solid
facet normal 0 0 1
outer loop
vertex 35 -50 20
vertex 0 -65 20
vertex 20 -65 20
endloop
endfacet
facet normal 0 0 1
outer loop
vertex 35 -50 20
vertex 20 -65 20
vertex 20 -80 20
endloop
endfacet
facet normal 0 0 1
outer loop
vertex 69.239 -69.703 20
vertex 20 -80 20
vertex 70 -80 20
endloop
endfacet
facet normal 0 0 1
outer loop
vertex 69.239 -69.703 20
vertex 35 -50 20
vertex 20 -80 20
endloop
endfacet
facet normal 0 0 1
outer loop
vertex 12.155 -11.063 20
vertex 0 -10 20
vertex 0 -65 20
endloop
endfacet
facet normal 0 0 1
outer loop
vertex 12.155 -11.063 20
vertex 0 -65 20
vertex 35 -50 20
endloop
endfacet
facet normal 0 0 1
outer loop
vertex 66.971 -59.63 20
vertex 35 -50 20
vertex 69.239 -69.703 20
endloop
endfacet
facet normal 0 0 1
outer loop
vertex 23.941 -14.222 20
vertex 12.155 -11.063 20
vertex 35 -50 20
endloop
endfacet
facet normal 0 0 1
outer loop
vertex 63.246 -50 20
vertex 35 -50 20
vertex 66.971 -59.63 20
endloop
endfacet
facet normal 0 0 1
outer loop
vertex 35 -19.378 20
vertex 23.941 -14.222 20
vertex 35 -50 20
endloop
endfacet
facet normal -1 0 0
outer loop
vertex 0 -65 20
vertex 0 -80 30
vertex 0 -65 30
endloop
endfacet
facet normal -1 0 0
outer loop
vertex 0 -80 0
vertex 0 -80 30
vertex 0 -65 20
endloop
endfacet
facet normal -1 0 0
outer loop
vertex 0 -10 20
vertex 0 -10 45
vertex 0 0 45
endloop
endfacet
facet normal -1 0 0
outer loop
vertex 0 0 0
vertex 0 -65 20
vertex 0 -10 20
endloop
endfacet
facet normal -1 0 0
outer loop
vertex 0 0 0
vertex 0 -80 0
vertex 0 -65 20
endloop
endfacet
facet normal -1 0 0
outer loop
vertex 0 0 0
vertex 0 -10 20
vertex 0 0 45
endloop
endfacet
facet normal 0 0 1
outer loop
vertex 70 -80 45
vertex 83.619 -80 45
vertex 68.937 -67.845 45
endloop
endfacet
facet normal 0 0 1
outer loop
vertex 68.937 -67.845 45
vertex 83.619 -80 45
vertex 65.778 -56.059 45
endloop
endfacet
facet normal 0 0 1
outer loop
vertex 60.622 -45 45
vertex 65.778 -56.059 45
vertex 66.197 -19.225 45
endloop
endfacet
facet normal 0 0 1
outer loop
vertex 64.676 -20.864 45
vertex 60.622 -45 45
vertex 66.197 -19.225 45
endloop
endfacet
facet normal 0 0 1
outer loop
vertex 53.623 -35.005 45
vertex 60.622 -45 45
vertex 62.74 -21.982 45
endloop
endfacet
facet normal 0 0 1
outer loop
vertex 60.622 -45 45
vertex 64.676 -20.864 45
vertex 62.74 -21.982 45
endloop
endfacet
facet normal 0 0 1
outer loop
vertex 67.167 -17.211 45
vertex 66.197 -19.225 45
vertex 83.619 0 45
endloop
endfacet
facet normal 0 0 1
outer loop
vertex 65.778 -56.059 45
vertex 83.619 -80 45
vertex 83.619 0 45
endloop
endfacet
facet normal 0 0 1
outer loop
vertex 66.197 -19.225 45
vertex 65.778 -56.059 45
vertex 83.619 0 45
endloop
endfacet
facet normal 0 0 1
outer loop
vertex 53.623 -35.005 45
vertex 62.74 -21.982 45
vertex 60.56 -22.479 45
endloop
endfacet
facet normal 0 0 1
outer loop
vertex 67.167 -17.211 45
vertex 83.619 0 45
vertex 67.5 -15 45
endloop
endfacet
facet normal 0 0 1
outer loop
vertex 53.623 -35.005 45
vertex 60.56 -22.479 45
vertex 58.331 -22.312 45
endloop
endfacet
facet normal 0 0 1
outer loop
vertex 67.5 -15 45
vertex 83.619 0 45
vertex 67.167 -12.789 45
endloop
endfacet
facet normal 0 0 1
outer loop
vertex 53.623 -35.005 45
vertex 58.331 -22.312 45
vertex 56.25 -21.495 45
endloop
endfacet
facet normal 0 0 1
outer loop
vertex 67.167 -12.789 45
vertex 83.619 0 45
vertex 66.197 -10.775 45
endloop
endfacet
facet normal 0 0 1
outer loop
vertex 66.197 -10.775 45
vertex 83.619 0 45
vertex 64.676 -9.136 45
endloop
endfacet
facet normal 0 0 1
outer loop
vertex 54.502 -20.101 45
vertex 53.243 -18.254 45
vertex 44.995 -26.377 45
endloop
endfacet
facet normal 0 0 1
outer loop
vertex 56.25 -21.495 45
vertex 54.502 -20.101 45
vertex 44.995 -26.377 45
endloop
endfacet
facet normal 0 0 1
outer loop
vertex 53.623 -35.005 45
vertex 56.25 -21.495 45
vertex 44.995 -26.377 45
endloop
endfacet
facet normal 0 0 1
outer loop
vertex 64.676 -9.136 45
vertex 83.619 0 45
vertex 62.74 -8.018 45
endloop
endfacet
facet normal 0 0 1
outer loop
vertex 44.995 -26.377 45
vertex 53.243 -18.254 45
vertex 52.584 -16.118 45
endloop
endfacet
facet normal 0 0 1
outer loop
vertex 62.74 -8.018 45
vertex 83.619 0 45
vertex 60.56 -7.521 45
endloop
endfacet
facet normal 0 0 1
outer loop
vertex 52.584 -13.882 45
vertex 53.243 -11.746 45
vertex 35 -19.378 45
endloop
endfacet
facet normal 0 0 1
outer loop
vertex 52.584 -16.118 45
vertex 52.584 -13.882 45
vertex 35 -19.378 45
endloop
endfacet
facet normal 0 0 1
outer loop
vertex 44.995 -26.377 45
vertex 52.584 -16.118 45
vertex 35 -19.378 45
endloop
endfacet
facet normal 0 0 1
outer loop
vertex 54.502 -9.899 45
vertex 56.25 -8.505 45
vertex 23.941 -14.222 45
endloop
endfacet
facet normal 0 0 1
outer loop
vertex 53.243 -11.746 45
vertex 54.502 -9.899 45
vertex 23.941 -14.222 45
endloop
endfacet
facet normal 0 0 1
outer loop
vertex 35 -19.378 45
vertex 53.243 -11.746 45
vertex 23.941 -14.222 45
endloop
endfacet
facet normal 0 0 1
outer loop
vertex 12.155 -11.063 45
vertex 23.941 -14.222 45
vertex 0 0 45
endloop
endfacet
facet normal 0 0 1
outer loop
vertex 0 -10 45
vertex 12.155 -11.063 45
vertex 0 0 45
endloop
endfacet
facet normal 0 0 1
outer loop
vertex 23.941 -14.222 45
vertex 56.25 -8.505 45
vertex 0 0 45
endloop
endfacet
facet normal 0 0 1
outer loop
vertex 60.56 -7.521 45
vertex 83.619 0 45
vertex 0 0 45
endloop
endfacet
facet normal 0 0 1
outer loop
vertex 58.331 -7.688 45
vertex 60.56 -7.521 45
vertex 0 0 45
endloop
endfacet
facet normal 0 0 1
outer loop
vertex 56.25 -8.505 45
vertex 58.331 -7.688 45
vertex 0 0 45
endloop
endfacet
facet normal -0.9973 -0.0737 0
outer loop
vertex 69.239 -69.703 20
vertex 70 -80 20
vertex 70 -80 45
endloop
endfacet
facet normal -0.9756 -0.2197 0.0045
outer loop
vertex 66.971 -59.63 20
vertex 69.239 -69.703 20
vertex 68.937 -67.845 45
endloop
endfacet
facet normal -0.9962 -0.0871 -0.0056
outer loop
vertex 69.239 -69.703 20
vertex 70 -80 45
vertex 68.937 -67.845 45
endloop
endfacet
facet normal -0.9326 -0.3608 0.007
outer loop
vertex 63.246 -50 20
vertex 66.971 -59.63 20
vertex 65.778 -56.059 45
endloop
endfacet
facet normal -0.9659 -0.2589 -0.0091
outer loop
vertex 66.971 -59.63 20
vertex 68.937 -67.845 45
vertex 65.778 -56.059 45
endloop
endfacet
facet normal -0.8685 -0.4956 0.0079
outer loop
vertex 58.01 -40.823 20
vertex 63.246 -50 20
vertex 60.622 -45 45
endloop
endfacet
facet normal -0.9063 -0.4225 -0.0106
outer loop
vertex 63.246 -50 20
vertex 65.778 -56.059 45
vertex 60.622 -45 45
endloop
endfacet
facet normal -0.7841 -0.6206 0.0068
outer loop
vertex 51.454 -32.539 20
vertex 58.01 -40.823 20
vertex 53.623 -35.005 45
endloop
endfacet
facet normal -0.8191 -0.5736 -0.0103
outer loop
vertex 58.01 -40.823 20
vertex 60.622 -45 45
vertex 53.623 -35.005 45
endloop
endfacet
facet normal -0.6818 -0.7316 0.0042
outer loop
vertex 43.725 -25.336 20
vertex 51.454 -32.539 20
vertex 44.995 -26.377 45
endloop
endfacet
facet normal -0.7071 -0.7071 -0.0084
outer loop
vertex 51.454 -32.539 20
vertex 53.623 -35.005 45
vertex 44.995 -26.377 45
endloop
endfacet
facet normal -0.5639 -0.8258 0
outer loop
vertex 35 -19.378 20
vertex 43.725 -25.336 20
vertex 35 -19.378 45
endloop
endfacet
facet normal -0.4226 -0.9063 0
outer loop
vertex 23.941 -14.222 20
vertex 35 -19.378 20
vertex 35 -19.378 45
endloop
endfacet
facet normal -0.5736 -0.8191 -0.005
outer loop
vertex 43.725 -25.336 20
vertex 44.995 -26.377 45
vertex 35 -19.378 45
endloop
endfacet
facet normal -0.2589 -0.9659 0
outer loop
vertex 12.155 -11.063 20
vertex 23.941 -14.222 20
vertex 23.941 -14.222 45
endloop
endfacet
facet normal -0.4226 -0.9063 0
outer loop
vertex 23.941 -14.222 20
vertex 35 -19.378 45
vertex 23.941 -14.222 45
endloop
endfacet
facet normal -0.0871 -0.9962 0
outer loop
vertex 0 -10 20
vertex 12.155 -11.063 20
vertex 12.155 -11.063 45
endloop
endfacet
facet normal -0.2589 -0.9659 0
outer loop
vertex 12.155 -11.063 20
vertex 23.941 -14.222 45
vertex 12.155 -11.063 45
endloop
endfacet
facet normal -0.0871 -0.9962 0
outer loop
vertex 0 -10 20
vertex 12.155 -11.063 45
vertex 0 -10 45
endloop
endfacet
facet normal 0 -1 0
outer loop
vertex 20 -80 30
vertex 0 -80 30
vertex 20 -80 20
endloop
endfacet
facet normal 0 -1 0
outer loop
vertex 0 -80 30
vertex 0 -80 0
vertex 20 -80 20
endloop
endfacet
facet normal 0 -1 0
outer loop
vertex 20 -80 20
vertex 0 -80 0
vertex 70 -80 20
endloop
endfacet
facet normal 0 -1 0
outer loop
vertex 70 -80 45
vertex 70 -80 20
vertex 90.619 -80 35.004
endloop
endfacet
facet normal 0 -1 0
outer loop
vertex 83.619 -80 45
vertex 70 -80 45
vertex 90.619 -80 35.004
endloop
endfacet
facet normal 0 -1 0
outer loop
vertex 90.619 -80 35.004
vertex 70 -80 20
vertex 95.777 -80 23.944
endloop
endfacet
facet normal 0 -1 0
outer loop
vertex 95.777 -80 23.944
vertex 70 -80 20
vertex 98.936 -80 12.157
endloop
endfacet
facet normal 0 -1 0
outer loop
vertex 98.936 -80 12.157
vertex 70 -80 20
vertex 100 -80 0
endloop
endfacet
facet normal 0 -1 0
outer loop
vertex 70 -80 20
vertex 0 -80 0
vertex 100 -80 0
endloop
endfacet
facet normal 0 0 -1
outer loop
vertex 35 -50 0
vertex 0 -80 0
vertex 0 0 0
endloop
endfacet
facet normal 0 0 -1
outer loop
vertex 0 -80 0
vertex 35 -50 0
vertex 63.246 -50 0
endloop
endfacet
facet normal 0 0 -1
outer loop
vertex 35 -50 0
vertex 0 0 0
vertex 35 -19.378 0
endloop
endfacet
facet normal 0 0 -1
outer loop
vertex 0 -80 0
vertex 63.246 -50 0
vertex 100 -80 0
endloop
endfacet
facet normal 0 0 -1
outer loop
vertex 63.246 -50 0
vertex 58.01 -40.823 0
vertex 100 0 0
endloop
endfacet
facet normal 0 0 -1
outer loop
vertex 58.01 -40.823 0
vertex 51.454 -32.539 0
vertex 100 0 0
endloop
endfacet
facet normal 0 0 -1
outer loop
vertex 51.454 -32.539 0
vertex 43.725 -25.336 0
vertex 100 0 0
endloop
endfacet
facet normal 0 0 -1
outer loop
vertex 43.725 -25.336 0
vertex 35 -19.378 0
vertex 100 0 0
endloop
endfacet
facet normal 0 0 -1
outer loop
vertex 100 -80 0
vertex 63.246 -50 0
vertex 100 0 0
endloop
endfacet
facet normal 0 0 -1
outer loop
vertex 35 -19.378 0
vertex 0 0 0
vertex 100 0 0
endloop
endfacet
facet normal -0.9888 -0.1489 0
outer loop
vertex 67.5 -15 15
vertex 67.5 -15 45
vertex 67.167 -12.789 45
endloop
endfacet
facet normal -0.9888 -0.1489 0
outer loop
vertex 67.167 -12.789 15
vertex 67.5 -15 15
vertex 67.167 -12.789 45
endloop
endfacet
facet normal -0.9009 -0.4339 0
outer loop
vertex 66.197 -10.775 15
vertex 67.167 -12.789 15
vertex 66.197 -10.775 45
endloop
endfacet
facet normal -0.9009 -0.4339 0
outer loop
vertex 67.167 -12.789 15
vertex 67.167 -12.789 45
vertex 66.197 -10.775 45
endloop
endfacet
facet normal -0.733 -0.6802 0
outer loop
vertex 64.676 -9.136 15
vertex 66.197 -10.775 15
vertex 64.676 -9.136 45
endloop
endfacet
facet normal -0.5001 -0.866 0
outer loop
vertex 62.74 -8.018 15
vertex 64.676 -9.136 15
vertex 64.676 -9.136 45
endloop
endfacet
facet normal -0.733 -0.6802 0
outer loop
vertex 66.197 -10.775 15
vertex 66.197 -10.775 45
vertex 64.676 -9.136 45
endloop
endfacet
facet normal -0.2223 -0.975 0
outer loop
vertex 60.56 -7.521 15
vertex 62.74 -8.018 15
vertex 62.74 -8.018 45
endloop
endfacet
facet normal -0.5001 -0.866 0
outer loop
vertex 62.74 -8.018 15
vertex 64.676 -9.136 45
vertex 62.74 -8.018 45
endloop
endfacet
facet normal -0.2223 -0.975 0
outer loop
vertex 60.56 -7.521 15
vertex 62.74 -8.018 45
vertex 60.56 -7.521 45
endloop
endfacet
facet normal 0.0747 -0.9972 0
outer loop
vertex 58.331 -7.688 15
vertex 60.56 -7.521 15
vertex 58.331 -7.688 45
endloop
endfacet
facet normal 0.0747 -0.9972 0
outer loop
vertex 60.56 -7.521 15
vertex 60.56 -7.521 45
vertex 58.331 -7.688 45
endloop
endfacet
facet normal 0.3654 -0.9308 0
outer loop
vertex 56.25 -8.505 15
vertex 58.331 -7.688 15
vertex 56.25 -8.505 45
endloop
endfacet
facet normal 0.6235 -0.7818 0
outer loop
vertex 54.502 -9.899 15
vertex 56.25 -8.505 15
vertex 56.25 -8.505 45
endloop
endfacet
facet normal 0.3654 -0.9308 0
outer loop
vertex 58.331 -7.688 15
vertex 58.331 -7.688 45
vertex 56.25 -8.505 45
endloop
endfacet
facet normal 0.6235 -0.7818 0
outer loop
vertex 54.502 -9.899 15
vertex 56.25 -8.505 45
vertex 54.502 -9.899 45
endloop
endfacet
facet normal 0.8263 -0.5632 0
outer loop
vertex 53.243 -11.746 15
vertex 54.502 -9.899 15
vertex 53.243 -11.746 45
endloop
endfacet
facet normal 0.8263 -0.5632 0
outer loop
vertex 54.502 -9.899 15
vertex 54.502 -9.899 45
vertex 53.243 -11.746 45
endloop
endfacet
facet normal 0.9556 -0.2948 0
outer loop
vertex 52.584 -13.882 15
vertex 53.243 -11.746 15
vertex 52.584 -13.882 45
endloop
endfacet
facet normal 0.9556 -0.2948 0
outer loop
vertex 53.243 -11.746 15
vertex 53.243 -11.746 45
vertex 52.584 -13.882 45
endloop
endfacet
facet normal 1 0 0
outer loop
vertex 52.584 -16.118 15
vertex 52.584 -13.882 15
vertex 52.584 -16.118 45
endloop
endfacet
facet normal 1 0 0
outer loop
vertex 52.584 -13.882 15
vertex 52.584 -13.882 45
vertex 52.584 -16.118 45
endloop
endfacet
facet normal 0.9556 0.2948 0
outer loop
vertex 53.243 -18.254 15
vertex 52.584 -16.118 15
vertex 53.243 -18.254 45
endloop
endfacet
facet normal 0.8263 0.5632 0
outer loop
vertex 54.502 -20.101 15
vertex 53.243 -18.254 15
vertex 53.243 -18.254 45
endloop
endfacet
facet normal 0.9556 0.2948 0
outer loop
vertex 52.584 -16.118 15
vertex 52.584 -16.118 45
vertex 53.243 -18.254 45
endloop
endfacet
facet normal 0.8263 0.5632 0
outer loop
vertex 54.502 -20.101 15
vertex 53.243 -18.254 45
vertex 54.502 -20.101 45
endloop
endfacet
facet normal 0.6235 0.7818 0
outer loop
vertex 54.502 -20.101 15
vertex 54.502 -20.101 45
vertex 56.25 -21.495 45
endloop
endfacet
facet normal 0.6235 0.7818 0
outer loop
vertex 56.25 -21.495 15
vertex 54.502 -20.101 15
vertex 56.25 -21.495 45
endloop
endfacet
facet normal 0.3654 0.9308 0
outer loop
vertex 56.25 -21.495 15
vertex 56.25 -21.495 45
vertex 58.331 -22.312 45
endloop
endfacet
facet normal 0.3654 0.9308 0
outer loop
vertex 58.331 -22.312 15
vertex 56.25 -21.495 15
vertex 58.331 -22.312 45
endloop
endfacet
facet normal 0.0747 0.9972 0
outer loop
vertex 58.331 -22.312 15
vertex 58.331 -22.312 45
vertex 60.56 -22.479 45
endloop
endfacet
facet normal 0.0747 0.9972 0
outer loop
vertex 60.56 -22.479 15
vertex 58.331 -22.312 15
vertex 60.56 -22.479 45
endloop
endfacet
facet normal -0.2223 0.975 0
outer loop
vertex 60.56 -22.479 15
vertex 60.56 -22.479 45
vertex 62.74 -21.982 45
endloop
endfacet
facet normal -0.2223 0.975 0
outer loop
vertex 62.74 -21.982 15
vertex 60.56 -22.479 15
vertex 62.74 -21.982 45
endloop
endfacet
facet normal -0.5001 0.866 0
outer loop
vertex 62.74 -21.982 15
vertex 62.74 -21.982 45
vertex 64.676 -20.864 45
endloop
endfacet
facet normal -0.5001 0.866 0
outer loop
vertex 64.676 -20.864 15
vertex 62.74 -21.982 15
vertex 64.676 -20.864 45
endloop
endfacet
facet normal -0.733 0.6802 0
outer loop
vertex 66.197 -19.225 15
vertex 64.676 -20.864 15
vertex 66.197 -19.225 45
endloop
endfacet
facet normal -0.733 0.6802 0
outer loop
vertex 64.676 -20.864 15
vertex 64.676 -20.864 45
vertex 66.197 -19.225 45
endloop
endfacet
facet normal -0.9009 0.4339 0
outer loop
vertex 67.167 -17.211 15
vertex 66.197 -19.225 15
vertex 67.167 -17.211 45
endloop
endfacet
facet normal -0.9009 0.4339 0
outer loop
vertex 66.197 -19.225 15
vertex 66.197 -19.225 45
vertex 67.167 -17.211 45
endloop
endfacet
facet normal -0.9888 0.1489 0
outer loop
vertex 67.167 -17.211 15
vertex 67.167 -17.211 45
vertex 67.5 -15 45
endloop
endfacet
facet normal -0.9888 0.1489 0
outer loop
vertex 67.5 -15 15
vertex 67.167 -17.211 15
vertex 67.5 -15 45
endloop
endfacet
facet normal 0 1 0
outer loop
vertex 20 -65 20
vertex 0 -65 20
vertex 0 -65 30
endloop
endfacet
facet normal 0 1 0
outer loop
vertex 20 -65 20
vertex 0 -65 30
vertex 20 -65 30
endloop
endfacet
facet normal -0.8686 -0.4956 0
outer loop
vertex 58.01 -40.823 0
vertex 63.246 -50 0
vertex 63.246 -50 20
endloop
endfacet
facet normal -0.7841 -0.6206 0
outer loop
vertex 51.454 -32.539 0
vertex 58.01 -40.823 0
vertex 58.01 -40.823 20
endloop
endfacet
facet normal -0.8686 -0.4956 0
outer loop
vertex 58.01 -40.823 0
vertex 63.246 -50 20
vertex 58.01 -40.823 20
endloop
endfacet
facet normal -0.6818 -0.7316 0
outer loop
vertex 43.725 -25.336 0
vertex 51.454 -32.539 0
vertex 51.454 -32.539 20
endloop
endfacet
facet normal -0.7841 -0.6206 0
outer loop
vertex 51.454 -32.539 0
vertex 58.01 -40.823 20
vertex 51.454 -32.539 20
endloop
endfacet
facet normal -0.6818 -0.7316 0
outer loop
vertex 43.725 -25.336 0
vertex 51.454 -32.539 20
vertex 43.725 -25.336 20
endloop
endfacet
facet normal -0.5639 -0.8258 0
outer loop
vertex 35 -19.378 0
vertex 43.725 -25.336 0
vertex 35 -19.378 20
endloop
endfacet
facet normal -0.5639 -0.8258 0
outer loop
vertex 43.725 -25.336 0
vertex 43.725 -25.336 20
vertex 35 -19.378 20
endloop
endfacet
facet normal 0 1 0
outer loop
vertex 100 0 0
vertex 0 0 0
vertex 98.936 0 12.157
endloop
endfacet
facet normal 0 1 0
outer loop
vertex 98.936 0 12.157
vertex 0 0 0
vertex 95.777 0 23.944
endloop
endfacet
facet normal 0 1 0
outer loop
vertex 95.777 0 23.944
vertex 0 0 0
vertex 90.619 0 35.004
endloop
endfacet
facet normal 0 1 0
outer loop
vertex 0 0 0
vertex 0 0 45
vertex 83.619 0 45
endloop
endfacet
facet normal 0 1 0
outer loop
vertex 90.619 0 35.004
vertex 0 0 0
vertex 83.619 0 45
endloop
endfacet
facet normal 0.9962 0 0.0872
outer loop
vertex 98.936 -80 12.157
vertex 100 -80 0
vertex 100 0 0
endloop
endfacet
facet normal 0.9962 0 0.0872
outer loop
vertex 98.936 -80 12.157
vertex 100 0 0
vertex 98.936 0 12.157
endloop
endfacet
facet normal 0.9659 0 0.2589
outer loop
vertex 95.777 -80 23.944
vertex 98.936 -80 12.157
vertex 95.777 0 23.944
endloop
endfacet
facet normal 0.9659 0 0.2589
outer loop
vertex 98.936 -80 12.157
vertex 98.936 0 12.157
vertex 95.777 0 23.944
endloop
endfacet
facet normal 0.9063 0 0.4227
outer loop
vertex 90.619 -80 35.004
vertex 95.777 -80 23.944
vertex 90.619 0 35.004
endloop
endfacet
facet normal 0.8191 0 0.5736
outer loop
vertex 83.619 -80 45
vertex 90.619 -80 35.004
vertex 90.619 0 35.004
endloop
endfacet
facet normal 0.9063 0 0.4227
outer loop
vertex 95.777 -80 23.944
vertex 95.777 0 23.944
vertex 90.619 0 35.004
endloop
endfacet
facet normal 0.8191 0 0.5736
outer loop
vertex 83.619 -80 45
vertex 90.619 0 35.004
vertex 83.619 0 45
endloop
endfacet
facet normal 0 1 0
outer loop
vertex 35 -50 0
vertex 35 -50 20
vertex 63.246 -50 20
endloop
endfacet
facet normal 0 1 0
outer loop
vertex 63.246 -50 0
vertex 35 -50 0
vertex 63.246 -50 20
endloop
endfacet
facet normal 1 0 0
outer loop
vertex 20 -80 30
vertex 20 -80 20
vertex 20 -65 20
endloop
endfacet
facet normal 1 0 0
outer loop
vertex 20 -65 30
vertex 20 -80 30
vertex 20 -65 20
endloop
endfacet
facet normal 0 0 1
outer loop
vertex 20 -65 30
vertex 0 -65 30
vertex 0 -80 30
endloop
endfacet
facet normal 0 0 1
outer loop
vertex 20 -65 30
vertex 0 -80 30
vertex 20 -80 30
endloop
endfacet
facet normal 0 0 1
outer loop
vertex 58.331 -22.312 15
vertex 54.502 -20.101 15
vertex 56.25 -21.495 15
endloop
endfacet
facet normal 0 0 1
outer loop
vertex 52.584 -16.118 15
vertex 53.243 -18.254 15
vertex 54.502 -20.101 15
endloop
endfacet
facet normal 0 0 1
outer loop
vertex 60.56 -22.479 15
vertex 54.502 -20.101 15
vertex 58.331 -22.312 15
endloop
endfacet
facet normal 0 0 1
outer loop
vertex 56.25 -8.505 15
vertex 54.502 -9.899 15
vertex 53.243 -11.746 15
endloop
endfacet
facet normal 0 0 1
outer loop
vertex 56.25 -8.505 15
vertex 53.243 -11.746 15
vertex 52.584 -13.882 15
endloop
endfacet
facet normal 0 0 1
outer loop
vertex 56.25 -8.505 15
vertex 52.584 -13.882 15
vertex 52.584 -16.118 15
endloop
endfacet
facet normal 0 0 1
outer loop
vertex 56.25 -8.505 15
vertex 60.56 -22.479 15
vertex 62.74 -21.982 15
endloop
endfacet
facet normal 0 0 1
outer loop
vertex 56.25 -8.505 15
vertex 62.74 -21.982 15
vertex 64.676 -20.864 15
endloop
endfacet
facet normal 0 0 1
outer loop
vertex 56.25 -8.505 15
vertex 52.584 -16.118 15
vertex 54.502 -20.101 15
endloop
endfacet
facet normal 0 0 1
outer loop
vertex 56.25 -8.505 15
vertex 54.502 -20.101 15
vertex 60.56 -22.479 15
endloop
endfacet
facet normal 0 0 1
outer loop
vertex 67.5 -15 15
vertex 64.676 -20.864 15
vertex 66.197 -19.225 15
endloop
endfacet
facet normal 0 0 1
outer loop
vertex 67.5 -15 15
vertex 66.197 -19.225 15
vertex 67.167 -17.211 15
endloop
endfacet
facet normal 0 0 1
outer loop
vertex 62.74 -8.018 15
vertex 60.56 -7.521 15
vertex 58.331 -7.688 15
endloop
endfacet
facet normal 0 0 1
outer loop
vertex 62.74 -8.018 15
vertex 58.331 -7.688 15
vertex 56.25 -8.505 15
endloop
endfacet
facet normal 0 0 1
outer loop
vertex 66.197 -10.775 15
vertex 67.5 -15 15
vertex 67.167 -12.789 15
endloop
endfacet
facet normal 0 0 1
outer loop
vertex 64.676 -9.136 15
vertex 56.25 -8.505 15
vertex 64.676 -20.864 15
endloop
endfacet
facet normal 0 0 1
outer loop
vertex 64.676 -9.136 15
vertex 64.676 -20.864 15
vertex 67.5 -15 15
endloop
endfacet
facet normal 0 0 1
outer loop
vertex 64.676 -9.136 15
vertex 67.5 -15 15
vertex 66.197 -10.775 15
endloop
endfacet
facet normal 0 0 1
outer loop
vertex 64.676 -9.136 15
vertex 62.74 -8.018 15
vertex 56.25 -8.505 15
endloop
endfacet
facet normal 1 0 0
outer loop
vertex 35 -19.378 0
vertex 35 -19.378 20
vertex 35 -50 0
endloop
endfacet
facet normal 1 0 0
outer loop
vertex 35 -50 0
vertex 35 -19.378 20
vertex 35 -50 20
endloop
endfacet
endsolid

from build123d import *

# Parameters (mm, degrees)
F1_DEPTH  = 80
F3_R      = 70
F4_DEPTH  = 25
F5_W      = 20
F5_H      = 15
F6_DEPTH  = 10
F8_DEPTH  = 20.001
F10_R     = 7.5
F11_DEPTH = 30


with BuildPart() as f1:
    # F0 (on Front) → F1 (new body)
    with BuildSketch(Plane.XZ):
        with BuildLine():
            Line((0, 0), (100, 0))
            ThreePointArc((100, 0), (95.777397, 23.944395), (83.619026, 45))
            Line((83.619026, 45), (0, 45))
            Line((0, 45), (0, 0))
        make_face()
    extrude(amount=F1_DEPTH)

    # F3 (on face) → F4 (cut, through all)
    with BuildSketch(Plane.XY.offset(45)):
        with Locations((0, -80)):
            Circle(F3_R)
    extrude(amount=-F4_DEPTH, mode=Mode.SUBTRACT)

    # F5 (on face) → F6 (join)
    with BuildSketch(Plane.XY.offset(20)):
        with Locations((10, -72.5)):
            Rectangle(F5_W, F5_H)
    extrude(amount=F6_DEPTH)

    # F7 (on face) → F8 (cut, through all)
    with BuildSketch(Plane.XY.offset(20)):
        with BuildLine():
            ThreePointArc((63.245553, -50), (51.453576, -32.539179), (35, -19.378222))
            Line((35, -19.378222), (35, -50))
            Line((35, -50), (63.245553, -50))
        make_face()
    extrude(amount=-F8_DEPTH, mode=Mode.SUBTRACT)

    # F10 (on face) → F11 (cut, through all)
    with BuildSketch(Plane.XY.offset(45)):
        with Locations((60, -15)):
            Circle(F10_R)
    extrude(amount=-F11_DEPTH, mode=Mode.SUBTRACT)


solid = f1.part
